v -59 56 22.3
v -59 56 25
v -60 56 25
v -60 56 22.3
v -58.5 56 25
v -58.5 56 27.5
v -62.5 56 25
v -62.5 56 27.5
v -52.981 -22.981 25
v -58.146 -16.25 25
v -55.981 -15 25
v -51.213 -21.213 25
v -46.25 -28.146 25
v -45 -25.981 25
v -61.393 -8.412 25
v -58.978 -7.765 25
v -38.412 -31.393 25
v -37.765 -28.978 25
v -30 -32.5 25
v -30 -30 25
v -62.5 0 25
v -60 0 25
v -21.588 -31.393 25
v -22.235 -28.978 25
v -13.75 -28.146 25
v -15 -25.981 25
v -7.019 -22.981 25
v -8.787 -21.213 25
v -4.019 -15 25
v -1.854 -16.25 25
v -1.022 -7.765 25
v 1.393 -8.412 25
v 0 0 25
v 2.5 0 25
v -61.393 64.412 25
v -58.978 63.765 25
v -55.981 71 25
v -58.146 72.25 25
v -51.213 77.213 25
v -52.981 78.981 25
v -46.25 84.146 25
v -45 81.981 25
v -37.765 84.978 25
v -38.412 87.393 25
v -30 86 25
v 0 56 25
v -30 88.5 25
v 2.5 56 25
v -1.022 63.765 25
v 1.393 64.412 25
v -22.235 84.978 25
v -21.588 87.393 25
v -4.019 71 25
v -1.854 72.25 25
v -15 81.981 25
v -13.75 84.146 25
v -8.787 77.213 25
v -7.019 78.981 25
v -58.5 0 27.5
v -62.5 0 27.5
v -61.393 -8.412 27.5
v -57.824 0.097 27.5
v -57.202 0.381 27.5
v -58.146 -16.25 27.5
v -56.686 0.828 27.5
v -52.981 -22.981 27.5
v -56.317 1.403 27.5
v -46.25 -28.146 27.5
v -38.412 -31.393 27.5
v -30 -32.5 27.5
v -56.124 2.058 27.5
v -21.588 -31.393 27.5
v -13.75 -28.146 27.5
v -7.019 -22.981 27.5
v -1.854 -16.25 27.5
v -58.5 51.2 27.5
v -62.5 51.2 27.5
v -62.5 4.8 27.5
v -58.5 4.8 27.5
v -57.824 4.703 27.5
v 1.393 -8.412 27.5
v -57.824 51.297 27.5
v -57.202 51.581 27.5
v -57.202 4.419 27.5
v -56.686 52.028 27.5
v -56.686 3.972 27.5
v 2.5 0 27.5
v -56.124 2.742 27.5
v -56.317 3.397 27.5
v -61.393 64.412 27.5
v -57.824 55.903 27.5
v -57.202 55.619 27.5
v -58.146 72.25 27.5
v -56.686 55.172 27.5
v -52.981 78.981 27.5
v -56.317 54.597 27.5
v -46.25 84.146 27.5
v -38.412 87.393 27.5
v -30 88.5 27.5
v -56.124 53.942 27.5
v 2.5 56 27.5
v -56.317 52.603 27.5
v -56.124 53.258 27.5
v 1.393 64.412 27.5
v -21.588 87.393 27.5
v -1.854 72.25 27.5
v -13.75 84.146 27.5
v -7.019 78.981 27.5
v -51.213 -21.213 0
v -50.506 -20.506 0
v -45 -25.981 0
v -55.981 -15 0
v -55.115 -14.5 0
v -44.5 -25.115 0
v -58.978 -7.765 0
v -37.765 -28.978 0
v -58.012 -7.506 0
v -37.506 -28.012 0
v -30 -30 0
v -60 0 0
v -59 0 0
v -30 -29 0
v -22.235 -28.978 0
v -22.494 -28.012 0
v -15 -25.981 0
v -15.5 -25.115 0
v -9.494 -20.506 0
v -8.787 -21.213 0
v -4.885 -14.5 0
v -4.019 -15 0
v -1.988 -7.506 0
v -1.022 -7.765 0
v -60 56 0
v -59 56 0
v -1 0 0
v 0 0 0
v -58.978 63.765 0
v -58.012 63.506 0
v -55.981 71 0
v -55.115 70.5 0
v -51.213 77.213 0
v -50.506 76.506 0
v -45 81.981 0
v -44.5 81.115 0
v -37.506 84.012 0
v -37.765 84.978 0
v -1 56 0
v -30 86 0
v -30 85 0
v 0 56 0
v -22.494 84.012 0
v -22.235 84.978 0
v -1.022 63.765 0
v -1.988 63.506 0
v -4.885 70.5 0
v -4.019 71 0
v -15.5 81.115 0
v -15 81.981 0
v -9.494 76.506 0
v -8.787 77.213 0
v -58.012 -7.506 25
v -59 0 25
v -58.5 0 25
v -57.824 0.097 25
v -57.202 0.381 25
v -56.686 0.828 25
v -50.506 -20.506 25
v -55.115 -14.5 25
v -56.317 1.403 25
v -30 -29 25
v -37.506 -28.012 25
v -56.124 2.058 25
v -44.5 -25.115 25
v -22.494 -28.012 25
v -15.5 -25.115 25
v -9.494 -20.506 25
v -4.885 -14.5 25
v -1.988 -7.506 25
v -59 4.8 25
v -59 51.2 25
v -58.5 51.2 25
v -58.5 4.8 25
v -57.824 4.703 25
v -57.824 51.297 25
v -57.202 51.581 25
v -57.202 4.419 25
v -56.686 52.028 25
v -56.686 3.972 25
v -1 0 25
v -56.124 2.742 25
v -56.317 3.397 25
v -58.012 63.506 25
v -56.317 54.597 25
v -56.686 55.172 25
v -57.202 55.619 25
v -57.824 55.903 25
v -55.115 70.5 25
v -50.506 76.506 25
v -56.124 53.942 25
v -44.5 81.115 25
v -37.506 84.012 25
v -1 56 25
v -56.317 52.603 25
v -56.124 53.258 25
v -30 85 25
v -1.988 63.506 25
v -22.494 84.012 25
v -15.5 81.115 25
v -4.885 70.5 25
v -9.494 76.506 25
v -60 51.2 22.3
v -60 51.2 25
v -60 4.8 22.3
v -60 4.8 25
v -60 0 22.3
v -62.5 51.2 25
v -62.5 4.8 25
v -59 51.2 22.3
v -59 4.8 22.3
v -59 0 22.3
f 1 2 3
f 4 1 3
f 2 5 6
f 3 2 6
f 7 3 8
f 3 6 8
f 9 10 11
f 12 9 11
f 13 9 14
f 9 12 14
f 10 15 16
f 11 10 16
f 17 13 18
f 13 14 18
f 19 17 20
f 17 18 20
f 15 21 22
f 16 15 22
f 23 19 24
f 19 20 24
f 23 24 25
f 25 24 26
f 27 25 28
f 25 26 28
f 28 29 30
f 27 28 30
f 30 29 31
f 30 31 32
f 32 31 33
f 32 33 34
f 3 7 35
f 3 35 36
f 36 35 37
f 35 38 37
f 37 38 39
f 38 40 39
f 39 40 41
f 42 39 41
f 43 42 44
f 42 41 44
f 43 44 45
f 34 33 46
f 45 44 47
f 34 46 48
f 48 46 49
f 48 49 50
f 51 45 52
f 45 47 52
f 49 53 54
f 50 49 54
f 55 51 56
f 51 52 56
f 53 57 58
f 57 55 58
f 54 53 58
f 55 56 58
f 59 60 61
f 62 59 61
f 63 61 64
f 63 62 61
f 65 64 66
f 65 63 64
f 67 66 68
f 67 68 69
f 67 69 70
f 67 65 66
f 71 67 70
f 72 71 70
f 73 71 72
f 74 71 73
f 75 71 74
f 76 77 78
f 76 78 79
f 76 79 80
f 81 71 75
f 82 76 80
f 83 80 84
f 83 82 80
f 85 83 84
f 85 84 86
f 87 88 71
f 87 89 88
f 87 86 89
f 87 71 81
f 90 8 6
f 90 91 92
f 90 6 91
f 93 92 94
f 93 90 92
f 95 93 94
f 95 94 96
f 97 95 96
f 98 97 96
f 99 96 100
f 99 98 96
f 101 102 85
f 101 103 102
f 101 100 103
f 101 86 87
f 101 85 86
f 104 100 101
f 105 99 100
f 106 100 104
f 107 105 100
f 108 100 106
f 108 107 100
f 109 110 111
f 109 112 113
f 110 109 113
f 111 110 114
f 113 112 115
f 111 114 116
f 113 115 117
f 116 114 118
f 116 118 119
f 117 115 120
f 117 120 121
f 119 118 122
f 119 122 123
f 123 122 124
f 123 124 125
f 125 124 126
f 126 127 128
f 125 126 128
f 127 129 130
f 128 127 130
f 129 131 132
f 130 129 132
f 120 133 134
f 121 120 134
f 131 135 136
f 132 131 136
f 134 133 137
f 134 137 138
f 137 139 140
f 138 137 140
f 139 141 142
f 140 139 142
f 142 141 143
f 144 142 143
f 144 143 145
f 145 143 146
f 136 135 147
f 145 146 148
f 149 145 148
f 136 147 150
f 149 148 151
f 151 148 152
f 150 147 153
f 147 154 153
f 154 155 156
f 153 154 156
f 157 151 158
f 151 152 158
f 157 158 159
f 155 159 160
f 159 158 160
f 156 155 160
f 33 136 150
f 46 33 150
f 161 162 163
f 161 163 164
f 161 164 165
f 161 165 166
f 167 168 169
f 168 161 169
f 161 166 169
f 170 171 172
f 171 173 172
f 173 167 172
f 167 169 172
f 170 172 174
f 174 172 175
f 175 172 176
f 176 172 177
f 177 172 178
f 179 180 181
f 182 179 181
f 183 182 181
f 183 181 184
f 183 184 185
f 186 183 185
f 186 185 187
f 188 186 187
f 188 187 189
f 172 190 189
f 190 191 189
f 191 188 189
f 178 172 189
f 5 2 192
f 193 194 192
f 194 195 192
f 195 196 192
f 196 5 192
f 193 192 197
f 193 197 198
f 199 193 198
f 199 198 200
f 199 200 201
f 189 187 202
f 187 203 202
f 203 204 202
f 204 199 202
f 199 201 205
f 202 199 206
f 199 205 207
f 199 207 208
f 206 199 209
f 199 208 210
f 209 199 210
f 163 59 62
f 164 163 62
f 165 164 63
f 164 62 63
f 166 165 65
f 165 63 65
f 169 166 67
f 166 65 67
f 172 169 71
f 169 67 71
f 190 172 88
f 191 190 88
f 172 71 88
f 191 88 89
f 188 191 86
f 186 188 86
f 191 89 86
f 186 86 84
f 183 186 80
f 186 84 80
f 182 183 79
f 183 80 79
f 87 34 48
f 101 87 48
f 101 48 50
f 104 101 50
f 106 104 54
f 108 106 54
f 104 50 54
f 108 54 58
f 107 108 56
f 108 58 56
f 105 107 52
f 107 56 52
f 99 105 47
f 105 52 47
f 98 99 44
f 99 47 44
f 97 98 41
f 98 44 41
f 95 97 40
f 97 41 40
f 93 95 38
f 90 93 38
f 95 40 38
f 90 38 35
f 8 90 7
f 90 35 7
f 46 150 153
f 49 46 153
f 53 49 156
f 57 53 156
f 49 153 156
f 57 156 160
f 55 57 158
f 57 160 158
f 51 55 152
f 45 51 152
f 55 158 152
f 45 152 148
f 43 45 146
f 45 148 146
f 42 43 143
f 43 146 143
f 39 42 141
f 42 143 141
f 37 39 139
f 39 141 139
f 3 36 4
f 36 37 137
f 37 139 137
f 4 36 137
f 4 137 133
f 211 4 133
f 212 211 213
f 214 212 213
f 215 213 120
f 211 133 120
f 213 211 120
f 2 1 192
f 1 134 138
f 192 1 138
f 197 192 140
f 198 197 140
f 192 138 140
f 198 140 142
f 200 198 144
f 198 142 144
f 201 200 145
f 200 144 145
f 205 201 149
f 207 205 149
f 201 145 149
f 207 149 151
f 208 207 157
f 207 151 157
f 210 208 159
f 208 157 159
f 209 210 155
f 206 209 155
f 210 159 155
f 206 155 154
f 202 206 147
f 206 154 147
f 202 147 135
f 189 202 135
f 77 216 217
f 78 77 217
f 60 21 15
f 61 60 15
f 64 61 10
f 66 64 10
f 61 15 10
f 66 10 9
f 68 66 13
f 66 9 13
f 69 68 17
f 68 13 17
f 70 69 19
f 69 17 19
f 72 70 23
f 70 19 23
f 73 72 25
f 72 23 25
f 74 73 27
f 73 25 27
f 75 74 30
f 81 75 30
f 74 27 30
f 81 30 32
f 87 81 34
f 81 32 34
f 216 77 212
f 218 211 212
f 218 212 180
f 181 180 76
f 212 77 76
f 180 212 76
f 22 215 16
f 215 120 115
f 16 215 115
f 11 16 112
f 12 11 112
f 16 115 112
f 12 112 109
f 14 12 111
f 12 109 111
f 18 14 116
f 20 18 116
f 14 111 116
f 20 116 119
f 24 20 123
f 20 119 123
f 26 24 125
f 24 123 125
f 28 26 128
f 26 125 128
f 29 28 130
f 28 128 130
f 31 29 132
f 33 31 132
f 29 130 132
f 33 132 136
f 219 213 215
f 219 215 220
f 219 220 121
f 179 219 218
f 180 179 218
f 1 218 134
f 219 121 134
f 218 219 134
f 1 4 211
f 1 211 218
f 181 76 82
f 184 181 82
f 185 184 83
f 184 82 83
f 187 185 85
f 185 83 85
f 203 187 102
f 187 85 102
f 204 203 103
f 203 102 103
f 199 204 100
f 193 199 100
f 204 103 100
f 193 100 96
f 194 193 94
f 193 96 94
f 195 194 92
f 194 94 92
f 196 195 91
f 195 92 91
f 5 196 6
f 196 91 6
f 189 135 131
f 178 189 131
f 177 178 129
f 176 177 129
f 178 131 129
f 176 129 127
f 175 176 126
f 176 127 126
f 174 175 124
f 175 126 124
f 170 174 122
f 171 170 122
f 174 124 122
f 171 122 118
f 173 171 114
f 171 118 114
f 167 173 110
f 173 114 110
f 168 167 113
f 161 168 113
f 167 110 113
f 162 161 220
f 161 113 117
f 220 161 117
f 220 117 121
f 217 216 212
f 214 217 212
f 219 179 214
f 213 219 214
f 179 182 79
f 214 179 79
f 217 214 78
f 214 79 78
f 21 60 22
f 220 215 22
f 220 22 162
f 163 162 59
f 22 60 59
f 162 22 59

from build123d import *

# Parameters (mm, degrees)
F1_DEPTH = 25
F3_DEPTH = 2.5
F5_DEPTH = 5.2


with BuildPart() as f1:
    # F0 (on Top) → F1 (new body)
    with BuildSketch(Plane.XY):
        with BuildLine():
            Line((-1, 0), (0, 0))
            Line((0, 0), (0, 56))
            ThreePointArc((0, 56), (-30, 86), (-60, 56))
            Line((-60, 56), (-60, 0))
            Line((-60, 0), (-59, 0))
            Line((-59, 0), (-59, 56))
            ThreePointArc((-59, 56), (-30, 85), (-1, 56))
            Line((-1, 56), (-1, 0))
        make_face()
        with BuildLine():
            ThreePointArc((-60, 0), (-30, -30), (0, 0))
            Line((0, 0), (-1, 0))
            ThreePointArc((-1, 0), (-30, -29), (-59, 0))
            Line((-59, 0), (-60, 0))
        make_face()
    extrude(amount=F1_DEPTH)

    # F2 (on face) → F3 (join)
    with BuildSketch(Plane.XY.offset(25)):
        with BuildLine():
            ThreePointArc((2.5, 56), (-30, 88.5), (-62.5, 56))
            Line((-62.5, 56), (-62.5, 0))
            ThreePointArc((-62.5, 0), (-30, -32.5), (2.5, 0))
            Line((2.5, 0), (2.5, 56))
        make_face()
        with BuildLine():
            Line((-60, 0), (-60, 56))
            ThreePointArc((-60, 56), (-30, 86), (0, 56))
            Line((0, 56), (0, 0))
            ThreePointArc((0, 0), (-30, -30), (-60, 0))
        make_face(mode=Mode.SUBTRACT)
        with BuildLine():
            ThreePointArc((0, 56), (-30, 86), (-60, 56))
            Line((-60, 56), (-60, 0))
            ThreePointArc((-60, 0), (-30, -30), (0, 0))
            Line((0, 0), (0, 56))
        make_face()
        with BuildLine():
            ThreePointArc((-1, 0), (-30, -29), (-59, 0))
            Line((-59, 0), (-59, 56))
            ThreePointArc((-59, 56), (-30, 85), (-1, 56))
            Line((-1, 56), (-1, 0))
        make_face(mode=Mode.SUBTRACT)
        with BuildLine():
            Line((-59, 56), (-59, 0))
            ThreePointArc((-59, 0), (-30, -29), (-1, 0))
            Line((-1, 0), (-1, 56))
            ThreePointArc((-1, 56), (-30, 85), (-59, 56))
        make_face()
    extrude(amount=F3_DEPTH)

    # F4 (on face) → F5 (cut)
    with BuildSketch(Plane.XY.offset(27.5)):
        with BuildLine():
            Line((-58.5, 56), (-62.5, 56))
            Line((-62.5, 56), (-62.5, 51.2))
            Line((-62.5, 51.2), (-58.5, 51.2))
            ThreePointArc((-58.5, 51.2), (-56.1, 53.6), (-58.5, 56))
        make_face()
        with BuildLine():
            Line((-58.5, 4.8), (-62.5, 4.8))
            Line((-62.5, 4.8), (-62.5, 0))
            Line((-62.5, 0), (-58.5, 0))
            ThreePointArc((-58.5, 0), (-56.1, 2.4), (-58.5, 4.8))
        make_face()
    extrude(amount=-F5_DEPTH, mode=Mode.SUBTRACT)


solid = f1.part
